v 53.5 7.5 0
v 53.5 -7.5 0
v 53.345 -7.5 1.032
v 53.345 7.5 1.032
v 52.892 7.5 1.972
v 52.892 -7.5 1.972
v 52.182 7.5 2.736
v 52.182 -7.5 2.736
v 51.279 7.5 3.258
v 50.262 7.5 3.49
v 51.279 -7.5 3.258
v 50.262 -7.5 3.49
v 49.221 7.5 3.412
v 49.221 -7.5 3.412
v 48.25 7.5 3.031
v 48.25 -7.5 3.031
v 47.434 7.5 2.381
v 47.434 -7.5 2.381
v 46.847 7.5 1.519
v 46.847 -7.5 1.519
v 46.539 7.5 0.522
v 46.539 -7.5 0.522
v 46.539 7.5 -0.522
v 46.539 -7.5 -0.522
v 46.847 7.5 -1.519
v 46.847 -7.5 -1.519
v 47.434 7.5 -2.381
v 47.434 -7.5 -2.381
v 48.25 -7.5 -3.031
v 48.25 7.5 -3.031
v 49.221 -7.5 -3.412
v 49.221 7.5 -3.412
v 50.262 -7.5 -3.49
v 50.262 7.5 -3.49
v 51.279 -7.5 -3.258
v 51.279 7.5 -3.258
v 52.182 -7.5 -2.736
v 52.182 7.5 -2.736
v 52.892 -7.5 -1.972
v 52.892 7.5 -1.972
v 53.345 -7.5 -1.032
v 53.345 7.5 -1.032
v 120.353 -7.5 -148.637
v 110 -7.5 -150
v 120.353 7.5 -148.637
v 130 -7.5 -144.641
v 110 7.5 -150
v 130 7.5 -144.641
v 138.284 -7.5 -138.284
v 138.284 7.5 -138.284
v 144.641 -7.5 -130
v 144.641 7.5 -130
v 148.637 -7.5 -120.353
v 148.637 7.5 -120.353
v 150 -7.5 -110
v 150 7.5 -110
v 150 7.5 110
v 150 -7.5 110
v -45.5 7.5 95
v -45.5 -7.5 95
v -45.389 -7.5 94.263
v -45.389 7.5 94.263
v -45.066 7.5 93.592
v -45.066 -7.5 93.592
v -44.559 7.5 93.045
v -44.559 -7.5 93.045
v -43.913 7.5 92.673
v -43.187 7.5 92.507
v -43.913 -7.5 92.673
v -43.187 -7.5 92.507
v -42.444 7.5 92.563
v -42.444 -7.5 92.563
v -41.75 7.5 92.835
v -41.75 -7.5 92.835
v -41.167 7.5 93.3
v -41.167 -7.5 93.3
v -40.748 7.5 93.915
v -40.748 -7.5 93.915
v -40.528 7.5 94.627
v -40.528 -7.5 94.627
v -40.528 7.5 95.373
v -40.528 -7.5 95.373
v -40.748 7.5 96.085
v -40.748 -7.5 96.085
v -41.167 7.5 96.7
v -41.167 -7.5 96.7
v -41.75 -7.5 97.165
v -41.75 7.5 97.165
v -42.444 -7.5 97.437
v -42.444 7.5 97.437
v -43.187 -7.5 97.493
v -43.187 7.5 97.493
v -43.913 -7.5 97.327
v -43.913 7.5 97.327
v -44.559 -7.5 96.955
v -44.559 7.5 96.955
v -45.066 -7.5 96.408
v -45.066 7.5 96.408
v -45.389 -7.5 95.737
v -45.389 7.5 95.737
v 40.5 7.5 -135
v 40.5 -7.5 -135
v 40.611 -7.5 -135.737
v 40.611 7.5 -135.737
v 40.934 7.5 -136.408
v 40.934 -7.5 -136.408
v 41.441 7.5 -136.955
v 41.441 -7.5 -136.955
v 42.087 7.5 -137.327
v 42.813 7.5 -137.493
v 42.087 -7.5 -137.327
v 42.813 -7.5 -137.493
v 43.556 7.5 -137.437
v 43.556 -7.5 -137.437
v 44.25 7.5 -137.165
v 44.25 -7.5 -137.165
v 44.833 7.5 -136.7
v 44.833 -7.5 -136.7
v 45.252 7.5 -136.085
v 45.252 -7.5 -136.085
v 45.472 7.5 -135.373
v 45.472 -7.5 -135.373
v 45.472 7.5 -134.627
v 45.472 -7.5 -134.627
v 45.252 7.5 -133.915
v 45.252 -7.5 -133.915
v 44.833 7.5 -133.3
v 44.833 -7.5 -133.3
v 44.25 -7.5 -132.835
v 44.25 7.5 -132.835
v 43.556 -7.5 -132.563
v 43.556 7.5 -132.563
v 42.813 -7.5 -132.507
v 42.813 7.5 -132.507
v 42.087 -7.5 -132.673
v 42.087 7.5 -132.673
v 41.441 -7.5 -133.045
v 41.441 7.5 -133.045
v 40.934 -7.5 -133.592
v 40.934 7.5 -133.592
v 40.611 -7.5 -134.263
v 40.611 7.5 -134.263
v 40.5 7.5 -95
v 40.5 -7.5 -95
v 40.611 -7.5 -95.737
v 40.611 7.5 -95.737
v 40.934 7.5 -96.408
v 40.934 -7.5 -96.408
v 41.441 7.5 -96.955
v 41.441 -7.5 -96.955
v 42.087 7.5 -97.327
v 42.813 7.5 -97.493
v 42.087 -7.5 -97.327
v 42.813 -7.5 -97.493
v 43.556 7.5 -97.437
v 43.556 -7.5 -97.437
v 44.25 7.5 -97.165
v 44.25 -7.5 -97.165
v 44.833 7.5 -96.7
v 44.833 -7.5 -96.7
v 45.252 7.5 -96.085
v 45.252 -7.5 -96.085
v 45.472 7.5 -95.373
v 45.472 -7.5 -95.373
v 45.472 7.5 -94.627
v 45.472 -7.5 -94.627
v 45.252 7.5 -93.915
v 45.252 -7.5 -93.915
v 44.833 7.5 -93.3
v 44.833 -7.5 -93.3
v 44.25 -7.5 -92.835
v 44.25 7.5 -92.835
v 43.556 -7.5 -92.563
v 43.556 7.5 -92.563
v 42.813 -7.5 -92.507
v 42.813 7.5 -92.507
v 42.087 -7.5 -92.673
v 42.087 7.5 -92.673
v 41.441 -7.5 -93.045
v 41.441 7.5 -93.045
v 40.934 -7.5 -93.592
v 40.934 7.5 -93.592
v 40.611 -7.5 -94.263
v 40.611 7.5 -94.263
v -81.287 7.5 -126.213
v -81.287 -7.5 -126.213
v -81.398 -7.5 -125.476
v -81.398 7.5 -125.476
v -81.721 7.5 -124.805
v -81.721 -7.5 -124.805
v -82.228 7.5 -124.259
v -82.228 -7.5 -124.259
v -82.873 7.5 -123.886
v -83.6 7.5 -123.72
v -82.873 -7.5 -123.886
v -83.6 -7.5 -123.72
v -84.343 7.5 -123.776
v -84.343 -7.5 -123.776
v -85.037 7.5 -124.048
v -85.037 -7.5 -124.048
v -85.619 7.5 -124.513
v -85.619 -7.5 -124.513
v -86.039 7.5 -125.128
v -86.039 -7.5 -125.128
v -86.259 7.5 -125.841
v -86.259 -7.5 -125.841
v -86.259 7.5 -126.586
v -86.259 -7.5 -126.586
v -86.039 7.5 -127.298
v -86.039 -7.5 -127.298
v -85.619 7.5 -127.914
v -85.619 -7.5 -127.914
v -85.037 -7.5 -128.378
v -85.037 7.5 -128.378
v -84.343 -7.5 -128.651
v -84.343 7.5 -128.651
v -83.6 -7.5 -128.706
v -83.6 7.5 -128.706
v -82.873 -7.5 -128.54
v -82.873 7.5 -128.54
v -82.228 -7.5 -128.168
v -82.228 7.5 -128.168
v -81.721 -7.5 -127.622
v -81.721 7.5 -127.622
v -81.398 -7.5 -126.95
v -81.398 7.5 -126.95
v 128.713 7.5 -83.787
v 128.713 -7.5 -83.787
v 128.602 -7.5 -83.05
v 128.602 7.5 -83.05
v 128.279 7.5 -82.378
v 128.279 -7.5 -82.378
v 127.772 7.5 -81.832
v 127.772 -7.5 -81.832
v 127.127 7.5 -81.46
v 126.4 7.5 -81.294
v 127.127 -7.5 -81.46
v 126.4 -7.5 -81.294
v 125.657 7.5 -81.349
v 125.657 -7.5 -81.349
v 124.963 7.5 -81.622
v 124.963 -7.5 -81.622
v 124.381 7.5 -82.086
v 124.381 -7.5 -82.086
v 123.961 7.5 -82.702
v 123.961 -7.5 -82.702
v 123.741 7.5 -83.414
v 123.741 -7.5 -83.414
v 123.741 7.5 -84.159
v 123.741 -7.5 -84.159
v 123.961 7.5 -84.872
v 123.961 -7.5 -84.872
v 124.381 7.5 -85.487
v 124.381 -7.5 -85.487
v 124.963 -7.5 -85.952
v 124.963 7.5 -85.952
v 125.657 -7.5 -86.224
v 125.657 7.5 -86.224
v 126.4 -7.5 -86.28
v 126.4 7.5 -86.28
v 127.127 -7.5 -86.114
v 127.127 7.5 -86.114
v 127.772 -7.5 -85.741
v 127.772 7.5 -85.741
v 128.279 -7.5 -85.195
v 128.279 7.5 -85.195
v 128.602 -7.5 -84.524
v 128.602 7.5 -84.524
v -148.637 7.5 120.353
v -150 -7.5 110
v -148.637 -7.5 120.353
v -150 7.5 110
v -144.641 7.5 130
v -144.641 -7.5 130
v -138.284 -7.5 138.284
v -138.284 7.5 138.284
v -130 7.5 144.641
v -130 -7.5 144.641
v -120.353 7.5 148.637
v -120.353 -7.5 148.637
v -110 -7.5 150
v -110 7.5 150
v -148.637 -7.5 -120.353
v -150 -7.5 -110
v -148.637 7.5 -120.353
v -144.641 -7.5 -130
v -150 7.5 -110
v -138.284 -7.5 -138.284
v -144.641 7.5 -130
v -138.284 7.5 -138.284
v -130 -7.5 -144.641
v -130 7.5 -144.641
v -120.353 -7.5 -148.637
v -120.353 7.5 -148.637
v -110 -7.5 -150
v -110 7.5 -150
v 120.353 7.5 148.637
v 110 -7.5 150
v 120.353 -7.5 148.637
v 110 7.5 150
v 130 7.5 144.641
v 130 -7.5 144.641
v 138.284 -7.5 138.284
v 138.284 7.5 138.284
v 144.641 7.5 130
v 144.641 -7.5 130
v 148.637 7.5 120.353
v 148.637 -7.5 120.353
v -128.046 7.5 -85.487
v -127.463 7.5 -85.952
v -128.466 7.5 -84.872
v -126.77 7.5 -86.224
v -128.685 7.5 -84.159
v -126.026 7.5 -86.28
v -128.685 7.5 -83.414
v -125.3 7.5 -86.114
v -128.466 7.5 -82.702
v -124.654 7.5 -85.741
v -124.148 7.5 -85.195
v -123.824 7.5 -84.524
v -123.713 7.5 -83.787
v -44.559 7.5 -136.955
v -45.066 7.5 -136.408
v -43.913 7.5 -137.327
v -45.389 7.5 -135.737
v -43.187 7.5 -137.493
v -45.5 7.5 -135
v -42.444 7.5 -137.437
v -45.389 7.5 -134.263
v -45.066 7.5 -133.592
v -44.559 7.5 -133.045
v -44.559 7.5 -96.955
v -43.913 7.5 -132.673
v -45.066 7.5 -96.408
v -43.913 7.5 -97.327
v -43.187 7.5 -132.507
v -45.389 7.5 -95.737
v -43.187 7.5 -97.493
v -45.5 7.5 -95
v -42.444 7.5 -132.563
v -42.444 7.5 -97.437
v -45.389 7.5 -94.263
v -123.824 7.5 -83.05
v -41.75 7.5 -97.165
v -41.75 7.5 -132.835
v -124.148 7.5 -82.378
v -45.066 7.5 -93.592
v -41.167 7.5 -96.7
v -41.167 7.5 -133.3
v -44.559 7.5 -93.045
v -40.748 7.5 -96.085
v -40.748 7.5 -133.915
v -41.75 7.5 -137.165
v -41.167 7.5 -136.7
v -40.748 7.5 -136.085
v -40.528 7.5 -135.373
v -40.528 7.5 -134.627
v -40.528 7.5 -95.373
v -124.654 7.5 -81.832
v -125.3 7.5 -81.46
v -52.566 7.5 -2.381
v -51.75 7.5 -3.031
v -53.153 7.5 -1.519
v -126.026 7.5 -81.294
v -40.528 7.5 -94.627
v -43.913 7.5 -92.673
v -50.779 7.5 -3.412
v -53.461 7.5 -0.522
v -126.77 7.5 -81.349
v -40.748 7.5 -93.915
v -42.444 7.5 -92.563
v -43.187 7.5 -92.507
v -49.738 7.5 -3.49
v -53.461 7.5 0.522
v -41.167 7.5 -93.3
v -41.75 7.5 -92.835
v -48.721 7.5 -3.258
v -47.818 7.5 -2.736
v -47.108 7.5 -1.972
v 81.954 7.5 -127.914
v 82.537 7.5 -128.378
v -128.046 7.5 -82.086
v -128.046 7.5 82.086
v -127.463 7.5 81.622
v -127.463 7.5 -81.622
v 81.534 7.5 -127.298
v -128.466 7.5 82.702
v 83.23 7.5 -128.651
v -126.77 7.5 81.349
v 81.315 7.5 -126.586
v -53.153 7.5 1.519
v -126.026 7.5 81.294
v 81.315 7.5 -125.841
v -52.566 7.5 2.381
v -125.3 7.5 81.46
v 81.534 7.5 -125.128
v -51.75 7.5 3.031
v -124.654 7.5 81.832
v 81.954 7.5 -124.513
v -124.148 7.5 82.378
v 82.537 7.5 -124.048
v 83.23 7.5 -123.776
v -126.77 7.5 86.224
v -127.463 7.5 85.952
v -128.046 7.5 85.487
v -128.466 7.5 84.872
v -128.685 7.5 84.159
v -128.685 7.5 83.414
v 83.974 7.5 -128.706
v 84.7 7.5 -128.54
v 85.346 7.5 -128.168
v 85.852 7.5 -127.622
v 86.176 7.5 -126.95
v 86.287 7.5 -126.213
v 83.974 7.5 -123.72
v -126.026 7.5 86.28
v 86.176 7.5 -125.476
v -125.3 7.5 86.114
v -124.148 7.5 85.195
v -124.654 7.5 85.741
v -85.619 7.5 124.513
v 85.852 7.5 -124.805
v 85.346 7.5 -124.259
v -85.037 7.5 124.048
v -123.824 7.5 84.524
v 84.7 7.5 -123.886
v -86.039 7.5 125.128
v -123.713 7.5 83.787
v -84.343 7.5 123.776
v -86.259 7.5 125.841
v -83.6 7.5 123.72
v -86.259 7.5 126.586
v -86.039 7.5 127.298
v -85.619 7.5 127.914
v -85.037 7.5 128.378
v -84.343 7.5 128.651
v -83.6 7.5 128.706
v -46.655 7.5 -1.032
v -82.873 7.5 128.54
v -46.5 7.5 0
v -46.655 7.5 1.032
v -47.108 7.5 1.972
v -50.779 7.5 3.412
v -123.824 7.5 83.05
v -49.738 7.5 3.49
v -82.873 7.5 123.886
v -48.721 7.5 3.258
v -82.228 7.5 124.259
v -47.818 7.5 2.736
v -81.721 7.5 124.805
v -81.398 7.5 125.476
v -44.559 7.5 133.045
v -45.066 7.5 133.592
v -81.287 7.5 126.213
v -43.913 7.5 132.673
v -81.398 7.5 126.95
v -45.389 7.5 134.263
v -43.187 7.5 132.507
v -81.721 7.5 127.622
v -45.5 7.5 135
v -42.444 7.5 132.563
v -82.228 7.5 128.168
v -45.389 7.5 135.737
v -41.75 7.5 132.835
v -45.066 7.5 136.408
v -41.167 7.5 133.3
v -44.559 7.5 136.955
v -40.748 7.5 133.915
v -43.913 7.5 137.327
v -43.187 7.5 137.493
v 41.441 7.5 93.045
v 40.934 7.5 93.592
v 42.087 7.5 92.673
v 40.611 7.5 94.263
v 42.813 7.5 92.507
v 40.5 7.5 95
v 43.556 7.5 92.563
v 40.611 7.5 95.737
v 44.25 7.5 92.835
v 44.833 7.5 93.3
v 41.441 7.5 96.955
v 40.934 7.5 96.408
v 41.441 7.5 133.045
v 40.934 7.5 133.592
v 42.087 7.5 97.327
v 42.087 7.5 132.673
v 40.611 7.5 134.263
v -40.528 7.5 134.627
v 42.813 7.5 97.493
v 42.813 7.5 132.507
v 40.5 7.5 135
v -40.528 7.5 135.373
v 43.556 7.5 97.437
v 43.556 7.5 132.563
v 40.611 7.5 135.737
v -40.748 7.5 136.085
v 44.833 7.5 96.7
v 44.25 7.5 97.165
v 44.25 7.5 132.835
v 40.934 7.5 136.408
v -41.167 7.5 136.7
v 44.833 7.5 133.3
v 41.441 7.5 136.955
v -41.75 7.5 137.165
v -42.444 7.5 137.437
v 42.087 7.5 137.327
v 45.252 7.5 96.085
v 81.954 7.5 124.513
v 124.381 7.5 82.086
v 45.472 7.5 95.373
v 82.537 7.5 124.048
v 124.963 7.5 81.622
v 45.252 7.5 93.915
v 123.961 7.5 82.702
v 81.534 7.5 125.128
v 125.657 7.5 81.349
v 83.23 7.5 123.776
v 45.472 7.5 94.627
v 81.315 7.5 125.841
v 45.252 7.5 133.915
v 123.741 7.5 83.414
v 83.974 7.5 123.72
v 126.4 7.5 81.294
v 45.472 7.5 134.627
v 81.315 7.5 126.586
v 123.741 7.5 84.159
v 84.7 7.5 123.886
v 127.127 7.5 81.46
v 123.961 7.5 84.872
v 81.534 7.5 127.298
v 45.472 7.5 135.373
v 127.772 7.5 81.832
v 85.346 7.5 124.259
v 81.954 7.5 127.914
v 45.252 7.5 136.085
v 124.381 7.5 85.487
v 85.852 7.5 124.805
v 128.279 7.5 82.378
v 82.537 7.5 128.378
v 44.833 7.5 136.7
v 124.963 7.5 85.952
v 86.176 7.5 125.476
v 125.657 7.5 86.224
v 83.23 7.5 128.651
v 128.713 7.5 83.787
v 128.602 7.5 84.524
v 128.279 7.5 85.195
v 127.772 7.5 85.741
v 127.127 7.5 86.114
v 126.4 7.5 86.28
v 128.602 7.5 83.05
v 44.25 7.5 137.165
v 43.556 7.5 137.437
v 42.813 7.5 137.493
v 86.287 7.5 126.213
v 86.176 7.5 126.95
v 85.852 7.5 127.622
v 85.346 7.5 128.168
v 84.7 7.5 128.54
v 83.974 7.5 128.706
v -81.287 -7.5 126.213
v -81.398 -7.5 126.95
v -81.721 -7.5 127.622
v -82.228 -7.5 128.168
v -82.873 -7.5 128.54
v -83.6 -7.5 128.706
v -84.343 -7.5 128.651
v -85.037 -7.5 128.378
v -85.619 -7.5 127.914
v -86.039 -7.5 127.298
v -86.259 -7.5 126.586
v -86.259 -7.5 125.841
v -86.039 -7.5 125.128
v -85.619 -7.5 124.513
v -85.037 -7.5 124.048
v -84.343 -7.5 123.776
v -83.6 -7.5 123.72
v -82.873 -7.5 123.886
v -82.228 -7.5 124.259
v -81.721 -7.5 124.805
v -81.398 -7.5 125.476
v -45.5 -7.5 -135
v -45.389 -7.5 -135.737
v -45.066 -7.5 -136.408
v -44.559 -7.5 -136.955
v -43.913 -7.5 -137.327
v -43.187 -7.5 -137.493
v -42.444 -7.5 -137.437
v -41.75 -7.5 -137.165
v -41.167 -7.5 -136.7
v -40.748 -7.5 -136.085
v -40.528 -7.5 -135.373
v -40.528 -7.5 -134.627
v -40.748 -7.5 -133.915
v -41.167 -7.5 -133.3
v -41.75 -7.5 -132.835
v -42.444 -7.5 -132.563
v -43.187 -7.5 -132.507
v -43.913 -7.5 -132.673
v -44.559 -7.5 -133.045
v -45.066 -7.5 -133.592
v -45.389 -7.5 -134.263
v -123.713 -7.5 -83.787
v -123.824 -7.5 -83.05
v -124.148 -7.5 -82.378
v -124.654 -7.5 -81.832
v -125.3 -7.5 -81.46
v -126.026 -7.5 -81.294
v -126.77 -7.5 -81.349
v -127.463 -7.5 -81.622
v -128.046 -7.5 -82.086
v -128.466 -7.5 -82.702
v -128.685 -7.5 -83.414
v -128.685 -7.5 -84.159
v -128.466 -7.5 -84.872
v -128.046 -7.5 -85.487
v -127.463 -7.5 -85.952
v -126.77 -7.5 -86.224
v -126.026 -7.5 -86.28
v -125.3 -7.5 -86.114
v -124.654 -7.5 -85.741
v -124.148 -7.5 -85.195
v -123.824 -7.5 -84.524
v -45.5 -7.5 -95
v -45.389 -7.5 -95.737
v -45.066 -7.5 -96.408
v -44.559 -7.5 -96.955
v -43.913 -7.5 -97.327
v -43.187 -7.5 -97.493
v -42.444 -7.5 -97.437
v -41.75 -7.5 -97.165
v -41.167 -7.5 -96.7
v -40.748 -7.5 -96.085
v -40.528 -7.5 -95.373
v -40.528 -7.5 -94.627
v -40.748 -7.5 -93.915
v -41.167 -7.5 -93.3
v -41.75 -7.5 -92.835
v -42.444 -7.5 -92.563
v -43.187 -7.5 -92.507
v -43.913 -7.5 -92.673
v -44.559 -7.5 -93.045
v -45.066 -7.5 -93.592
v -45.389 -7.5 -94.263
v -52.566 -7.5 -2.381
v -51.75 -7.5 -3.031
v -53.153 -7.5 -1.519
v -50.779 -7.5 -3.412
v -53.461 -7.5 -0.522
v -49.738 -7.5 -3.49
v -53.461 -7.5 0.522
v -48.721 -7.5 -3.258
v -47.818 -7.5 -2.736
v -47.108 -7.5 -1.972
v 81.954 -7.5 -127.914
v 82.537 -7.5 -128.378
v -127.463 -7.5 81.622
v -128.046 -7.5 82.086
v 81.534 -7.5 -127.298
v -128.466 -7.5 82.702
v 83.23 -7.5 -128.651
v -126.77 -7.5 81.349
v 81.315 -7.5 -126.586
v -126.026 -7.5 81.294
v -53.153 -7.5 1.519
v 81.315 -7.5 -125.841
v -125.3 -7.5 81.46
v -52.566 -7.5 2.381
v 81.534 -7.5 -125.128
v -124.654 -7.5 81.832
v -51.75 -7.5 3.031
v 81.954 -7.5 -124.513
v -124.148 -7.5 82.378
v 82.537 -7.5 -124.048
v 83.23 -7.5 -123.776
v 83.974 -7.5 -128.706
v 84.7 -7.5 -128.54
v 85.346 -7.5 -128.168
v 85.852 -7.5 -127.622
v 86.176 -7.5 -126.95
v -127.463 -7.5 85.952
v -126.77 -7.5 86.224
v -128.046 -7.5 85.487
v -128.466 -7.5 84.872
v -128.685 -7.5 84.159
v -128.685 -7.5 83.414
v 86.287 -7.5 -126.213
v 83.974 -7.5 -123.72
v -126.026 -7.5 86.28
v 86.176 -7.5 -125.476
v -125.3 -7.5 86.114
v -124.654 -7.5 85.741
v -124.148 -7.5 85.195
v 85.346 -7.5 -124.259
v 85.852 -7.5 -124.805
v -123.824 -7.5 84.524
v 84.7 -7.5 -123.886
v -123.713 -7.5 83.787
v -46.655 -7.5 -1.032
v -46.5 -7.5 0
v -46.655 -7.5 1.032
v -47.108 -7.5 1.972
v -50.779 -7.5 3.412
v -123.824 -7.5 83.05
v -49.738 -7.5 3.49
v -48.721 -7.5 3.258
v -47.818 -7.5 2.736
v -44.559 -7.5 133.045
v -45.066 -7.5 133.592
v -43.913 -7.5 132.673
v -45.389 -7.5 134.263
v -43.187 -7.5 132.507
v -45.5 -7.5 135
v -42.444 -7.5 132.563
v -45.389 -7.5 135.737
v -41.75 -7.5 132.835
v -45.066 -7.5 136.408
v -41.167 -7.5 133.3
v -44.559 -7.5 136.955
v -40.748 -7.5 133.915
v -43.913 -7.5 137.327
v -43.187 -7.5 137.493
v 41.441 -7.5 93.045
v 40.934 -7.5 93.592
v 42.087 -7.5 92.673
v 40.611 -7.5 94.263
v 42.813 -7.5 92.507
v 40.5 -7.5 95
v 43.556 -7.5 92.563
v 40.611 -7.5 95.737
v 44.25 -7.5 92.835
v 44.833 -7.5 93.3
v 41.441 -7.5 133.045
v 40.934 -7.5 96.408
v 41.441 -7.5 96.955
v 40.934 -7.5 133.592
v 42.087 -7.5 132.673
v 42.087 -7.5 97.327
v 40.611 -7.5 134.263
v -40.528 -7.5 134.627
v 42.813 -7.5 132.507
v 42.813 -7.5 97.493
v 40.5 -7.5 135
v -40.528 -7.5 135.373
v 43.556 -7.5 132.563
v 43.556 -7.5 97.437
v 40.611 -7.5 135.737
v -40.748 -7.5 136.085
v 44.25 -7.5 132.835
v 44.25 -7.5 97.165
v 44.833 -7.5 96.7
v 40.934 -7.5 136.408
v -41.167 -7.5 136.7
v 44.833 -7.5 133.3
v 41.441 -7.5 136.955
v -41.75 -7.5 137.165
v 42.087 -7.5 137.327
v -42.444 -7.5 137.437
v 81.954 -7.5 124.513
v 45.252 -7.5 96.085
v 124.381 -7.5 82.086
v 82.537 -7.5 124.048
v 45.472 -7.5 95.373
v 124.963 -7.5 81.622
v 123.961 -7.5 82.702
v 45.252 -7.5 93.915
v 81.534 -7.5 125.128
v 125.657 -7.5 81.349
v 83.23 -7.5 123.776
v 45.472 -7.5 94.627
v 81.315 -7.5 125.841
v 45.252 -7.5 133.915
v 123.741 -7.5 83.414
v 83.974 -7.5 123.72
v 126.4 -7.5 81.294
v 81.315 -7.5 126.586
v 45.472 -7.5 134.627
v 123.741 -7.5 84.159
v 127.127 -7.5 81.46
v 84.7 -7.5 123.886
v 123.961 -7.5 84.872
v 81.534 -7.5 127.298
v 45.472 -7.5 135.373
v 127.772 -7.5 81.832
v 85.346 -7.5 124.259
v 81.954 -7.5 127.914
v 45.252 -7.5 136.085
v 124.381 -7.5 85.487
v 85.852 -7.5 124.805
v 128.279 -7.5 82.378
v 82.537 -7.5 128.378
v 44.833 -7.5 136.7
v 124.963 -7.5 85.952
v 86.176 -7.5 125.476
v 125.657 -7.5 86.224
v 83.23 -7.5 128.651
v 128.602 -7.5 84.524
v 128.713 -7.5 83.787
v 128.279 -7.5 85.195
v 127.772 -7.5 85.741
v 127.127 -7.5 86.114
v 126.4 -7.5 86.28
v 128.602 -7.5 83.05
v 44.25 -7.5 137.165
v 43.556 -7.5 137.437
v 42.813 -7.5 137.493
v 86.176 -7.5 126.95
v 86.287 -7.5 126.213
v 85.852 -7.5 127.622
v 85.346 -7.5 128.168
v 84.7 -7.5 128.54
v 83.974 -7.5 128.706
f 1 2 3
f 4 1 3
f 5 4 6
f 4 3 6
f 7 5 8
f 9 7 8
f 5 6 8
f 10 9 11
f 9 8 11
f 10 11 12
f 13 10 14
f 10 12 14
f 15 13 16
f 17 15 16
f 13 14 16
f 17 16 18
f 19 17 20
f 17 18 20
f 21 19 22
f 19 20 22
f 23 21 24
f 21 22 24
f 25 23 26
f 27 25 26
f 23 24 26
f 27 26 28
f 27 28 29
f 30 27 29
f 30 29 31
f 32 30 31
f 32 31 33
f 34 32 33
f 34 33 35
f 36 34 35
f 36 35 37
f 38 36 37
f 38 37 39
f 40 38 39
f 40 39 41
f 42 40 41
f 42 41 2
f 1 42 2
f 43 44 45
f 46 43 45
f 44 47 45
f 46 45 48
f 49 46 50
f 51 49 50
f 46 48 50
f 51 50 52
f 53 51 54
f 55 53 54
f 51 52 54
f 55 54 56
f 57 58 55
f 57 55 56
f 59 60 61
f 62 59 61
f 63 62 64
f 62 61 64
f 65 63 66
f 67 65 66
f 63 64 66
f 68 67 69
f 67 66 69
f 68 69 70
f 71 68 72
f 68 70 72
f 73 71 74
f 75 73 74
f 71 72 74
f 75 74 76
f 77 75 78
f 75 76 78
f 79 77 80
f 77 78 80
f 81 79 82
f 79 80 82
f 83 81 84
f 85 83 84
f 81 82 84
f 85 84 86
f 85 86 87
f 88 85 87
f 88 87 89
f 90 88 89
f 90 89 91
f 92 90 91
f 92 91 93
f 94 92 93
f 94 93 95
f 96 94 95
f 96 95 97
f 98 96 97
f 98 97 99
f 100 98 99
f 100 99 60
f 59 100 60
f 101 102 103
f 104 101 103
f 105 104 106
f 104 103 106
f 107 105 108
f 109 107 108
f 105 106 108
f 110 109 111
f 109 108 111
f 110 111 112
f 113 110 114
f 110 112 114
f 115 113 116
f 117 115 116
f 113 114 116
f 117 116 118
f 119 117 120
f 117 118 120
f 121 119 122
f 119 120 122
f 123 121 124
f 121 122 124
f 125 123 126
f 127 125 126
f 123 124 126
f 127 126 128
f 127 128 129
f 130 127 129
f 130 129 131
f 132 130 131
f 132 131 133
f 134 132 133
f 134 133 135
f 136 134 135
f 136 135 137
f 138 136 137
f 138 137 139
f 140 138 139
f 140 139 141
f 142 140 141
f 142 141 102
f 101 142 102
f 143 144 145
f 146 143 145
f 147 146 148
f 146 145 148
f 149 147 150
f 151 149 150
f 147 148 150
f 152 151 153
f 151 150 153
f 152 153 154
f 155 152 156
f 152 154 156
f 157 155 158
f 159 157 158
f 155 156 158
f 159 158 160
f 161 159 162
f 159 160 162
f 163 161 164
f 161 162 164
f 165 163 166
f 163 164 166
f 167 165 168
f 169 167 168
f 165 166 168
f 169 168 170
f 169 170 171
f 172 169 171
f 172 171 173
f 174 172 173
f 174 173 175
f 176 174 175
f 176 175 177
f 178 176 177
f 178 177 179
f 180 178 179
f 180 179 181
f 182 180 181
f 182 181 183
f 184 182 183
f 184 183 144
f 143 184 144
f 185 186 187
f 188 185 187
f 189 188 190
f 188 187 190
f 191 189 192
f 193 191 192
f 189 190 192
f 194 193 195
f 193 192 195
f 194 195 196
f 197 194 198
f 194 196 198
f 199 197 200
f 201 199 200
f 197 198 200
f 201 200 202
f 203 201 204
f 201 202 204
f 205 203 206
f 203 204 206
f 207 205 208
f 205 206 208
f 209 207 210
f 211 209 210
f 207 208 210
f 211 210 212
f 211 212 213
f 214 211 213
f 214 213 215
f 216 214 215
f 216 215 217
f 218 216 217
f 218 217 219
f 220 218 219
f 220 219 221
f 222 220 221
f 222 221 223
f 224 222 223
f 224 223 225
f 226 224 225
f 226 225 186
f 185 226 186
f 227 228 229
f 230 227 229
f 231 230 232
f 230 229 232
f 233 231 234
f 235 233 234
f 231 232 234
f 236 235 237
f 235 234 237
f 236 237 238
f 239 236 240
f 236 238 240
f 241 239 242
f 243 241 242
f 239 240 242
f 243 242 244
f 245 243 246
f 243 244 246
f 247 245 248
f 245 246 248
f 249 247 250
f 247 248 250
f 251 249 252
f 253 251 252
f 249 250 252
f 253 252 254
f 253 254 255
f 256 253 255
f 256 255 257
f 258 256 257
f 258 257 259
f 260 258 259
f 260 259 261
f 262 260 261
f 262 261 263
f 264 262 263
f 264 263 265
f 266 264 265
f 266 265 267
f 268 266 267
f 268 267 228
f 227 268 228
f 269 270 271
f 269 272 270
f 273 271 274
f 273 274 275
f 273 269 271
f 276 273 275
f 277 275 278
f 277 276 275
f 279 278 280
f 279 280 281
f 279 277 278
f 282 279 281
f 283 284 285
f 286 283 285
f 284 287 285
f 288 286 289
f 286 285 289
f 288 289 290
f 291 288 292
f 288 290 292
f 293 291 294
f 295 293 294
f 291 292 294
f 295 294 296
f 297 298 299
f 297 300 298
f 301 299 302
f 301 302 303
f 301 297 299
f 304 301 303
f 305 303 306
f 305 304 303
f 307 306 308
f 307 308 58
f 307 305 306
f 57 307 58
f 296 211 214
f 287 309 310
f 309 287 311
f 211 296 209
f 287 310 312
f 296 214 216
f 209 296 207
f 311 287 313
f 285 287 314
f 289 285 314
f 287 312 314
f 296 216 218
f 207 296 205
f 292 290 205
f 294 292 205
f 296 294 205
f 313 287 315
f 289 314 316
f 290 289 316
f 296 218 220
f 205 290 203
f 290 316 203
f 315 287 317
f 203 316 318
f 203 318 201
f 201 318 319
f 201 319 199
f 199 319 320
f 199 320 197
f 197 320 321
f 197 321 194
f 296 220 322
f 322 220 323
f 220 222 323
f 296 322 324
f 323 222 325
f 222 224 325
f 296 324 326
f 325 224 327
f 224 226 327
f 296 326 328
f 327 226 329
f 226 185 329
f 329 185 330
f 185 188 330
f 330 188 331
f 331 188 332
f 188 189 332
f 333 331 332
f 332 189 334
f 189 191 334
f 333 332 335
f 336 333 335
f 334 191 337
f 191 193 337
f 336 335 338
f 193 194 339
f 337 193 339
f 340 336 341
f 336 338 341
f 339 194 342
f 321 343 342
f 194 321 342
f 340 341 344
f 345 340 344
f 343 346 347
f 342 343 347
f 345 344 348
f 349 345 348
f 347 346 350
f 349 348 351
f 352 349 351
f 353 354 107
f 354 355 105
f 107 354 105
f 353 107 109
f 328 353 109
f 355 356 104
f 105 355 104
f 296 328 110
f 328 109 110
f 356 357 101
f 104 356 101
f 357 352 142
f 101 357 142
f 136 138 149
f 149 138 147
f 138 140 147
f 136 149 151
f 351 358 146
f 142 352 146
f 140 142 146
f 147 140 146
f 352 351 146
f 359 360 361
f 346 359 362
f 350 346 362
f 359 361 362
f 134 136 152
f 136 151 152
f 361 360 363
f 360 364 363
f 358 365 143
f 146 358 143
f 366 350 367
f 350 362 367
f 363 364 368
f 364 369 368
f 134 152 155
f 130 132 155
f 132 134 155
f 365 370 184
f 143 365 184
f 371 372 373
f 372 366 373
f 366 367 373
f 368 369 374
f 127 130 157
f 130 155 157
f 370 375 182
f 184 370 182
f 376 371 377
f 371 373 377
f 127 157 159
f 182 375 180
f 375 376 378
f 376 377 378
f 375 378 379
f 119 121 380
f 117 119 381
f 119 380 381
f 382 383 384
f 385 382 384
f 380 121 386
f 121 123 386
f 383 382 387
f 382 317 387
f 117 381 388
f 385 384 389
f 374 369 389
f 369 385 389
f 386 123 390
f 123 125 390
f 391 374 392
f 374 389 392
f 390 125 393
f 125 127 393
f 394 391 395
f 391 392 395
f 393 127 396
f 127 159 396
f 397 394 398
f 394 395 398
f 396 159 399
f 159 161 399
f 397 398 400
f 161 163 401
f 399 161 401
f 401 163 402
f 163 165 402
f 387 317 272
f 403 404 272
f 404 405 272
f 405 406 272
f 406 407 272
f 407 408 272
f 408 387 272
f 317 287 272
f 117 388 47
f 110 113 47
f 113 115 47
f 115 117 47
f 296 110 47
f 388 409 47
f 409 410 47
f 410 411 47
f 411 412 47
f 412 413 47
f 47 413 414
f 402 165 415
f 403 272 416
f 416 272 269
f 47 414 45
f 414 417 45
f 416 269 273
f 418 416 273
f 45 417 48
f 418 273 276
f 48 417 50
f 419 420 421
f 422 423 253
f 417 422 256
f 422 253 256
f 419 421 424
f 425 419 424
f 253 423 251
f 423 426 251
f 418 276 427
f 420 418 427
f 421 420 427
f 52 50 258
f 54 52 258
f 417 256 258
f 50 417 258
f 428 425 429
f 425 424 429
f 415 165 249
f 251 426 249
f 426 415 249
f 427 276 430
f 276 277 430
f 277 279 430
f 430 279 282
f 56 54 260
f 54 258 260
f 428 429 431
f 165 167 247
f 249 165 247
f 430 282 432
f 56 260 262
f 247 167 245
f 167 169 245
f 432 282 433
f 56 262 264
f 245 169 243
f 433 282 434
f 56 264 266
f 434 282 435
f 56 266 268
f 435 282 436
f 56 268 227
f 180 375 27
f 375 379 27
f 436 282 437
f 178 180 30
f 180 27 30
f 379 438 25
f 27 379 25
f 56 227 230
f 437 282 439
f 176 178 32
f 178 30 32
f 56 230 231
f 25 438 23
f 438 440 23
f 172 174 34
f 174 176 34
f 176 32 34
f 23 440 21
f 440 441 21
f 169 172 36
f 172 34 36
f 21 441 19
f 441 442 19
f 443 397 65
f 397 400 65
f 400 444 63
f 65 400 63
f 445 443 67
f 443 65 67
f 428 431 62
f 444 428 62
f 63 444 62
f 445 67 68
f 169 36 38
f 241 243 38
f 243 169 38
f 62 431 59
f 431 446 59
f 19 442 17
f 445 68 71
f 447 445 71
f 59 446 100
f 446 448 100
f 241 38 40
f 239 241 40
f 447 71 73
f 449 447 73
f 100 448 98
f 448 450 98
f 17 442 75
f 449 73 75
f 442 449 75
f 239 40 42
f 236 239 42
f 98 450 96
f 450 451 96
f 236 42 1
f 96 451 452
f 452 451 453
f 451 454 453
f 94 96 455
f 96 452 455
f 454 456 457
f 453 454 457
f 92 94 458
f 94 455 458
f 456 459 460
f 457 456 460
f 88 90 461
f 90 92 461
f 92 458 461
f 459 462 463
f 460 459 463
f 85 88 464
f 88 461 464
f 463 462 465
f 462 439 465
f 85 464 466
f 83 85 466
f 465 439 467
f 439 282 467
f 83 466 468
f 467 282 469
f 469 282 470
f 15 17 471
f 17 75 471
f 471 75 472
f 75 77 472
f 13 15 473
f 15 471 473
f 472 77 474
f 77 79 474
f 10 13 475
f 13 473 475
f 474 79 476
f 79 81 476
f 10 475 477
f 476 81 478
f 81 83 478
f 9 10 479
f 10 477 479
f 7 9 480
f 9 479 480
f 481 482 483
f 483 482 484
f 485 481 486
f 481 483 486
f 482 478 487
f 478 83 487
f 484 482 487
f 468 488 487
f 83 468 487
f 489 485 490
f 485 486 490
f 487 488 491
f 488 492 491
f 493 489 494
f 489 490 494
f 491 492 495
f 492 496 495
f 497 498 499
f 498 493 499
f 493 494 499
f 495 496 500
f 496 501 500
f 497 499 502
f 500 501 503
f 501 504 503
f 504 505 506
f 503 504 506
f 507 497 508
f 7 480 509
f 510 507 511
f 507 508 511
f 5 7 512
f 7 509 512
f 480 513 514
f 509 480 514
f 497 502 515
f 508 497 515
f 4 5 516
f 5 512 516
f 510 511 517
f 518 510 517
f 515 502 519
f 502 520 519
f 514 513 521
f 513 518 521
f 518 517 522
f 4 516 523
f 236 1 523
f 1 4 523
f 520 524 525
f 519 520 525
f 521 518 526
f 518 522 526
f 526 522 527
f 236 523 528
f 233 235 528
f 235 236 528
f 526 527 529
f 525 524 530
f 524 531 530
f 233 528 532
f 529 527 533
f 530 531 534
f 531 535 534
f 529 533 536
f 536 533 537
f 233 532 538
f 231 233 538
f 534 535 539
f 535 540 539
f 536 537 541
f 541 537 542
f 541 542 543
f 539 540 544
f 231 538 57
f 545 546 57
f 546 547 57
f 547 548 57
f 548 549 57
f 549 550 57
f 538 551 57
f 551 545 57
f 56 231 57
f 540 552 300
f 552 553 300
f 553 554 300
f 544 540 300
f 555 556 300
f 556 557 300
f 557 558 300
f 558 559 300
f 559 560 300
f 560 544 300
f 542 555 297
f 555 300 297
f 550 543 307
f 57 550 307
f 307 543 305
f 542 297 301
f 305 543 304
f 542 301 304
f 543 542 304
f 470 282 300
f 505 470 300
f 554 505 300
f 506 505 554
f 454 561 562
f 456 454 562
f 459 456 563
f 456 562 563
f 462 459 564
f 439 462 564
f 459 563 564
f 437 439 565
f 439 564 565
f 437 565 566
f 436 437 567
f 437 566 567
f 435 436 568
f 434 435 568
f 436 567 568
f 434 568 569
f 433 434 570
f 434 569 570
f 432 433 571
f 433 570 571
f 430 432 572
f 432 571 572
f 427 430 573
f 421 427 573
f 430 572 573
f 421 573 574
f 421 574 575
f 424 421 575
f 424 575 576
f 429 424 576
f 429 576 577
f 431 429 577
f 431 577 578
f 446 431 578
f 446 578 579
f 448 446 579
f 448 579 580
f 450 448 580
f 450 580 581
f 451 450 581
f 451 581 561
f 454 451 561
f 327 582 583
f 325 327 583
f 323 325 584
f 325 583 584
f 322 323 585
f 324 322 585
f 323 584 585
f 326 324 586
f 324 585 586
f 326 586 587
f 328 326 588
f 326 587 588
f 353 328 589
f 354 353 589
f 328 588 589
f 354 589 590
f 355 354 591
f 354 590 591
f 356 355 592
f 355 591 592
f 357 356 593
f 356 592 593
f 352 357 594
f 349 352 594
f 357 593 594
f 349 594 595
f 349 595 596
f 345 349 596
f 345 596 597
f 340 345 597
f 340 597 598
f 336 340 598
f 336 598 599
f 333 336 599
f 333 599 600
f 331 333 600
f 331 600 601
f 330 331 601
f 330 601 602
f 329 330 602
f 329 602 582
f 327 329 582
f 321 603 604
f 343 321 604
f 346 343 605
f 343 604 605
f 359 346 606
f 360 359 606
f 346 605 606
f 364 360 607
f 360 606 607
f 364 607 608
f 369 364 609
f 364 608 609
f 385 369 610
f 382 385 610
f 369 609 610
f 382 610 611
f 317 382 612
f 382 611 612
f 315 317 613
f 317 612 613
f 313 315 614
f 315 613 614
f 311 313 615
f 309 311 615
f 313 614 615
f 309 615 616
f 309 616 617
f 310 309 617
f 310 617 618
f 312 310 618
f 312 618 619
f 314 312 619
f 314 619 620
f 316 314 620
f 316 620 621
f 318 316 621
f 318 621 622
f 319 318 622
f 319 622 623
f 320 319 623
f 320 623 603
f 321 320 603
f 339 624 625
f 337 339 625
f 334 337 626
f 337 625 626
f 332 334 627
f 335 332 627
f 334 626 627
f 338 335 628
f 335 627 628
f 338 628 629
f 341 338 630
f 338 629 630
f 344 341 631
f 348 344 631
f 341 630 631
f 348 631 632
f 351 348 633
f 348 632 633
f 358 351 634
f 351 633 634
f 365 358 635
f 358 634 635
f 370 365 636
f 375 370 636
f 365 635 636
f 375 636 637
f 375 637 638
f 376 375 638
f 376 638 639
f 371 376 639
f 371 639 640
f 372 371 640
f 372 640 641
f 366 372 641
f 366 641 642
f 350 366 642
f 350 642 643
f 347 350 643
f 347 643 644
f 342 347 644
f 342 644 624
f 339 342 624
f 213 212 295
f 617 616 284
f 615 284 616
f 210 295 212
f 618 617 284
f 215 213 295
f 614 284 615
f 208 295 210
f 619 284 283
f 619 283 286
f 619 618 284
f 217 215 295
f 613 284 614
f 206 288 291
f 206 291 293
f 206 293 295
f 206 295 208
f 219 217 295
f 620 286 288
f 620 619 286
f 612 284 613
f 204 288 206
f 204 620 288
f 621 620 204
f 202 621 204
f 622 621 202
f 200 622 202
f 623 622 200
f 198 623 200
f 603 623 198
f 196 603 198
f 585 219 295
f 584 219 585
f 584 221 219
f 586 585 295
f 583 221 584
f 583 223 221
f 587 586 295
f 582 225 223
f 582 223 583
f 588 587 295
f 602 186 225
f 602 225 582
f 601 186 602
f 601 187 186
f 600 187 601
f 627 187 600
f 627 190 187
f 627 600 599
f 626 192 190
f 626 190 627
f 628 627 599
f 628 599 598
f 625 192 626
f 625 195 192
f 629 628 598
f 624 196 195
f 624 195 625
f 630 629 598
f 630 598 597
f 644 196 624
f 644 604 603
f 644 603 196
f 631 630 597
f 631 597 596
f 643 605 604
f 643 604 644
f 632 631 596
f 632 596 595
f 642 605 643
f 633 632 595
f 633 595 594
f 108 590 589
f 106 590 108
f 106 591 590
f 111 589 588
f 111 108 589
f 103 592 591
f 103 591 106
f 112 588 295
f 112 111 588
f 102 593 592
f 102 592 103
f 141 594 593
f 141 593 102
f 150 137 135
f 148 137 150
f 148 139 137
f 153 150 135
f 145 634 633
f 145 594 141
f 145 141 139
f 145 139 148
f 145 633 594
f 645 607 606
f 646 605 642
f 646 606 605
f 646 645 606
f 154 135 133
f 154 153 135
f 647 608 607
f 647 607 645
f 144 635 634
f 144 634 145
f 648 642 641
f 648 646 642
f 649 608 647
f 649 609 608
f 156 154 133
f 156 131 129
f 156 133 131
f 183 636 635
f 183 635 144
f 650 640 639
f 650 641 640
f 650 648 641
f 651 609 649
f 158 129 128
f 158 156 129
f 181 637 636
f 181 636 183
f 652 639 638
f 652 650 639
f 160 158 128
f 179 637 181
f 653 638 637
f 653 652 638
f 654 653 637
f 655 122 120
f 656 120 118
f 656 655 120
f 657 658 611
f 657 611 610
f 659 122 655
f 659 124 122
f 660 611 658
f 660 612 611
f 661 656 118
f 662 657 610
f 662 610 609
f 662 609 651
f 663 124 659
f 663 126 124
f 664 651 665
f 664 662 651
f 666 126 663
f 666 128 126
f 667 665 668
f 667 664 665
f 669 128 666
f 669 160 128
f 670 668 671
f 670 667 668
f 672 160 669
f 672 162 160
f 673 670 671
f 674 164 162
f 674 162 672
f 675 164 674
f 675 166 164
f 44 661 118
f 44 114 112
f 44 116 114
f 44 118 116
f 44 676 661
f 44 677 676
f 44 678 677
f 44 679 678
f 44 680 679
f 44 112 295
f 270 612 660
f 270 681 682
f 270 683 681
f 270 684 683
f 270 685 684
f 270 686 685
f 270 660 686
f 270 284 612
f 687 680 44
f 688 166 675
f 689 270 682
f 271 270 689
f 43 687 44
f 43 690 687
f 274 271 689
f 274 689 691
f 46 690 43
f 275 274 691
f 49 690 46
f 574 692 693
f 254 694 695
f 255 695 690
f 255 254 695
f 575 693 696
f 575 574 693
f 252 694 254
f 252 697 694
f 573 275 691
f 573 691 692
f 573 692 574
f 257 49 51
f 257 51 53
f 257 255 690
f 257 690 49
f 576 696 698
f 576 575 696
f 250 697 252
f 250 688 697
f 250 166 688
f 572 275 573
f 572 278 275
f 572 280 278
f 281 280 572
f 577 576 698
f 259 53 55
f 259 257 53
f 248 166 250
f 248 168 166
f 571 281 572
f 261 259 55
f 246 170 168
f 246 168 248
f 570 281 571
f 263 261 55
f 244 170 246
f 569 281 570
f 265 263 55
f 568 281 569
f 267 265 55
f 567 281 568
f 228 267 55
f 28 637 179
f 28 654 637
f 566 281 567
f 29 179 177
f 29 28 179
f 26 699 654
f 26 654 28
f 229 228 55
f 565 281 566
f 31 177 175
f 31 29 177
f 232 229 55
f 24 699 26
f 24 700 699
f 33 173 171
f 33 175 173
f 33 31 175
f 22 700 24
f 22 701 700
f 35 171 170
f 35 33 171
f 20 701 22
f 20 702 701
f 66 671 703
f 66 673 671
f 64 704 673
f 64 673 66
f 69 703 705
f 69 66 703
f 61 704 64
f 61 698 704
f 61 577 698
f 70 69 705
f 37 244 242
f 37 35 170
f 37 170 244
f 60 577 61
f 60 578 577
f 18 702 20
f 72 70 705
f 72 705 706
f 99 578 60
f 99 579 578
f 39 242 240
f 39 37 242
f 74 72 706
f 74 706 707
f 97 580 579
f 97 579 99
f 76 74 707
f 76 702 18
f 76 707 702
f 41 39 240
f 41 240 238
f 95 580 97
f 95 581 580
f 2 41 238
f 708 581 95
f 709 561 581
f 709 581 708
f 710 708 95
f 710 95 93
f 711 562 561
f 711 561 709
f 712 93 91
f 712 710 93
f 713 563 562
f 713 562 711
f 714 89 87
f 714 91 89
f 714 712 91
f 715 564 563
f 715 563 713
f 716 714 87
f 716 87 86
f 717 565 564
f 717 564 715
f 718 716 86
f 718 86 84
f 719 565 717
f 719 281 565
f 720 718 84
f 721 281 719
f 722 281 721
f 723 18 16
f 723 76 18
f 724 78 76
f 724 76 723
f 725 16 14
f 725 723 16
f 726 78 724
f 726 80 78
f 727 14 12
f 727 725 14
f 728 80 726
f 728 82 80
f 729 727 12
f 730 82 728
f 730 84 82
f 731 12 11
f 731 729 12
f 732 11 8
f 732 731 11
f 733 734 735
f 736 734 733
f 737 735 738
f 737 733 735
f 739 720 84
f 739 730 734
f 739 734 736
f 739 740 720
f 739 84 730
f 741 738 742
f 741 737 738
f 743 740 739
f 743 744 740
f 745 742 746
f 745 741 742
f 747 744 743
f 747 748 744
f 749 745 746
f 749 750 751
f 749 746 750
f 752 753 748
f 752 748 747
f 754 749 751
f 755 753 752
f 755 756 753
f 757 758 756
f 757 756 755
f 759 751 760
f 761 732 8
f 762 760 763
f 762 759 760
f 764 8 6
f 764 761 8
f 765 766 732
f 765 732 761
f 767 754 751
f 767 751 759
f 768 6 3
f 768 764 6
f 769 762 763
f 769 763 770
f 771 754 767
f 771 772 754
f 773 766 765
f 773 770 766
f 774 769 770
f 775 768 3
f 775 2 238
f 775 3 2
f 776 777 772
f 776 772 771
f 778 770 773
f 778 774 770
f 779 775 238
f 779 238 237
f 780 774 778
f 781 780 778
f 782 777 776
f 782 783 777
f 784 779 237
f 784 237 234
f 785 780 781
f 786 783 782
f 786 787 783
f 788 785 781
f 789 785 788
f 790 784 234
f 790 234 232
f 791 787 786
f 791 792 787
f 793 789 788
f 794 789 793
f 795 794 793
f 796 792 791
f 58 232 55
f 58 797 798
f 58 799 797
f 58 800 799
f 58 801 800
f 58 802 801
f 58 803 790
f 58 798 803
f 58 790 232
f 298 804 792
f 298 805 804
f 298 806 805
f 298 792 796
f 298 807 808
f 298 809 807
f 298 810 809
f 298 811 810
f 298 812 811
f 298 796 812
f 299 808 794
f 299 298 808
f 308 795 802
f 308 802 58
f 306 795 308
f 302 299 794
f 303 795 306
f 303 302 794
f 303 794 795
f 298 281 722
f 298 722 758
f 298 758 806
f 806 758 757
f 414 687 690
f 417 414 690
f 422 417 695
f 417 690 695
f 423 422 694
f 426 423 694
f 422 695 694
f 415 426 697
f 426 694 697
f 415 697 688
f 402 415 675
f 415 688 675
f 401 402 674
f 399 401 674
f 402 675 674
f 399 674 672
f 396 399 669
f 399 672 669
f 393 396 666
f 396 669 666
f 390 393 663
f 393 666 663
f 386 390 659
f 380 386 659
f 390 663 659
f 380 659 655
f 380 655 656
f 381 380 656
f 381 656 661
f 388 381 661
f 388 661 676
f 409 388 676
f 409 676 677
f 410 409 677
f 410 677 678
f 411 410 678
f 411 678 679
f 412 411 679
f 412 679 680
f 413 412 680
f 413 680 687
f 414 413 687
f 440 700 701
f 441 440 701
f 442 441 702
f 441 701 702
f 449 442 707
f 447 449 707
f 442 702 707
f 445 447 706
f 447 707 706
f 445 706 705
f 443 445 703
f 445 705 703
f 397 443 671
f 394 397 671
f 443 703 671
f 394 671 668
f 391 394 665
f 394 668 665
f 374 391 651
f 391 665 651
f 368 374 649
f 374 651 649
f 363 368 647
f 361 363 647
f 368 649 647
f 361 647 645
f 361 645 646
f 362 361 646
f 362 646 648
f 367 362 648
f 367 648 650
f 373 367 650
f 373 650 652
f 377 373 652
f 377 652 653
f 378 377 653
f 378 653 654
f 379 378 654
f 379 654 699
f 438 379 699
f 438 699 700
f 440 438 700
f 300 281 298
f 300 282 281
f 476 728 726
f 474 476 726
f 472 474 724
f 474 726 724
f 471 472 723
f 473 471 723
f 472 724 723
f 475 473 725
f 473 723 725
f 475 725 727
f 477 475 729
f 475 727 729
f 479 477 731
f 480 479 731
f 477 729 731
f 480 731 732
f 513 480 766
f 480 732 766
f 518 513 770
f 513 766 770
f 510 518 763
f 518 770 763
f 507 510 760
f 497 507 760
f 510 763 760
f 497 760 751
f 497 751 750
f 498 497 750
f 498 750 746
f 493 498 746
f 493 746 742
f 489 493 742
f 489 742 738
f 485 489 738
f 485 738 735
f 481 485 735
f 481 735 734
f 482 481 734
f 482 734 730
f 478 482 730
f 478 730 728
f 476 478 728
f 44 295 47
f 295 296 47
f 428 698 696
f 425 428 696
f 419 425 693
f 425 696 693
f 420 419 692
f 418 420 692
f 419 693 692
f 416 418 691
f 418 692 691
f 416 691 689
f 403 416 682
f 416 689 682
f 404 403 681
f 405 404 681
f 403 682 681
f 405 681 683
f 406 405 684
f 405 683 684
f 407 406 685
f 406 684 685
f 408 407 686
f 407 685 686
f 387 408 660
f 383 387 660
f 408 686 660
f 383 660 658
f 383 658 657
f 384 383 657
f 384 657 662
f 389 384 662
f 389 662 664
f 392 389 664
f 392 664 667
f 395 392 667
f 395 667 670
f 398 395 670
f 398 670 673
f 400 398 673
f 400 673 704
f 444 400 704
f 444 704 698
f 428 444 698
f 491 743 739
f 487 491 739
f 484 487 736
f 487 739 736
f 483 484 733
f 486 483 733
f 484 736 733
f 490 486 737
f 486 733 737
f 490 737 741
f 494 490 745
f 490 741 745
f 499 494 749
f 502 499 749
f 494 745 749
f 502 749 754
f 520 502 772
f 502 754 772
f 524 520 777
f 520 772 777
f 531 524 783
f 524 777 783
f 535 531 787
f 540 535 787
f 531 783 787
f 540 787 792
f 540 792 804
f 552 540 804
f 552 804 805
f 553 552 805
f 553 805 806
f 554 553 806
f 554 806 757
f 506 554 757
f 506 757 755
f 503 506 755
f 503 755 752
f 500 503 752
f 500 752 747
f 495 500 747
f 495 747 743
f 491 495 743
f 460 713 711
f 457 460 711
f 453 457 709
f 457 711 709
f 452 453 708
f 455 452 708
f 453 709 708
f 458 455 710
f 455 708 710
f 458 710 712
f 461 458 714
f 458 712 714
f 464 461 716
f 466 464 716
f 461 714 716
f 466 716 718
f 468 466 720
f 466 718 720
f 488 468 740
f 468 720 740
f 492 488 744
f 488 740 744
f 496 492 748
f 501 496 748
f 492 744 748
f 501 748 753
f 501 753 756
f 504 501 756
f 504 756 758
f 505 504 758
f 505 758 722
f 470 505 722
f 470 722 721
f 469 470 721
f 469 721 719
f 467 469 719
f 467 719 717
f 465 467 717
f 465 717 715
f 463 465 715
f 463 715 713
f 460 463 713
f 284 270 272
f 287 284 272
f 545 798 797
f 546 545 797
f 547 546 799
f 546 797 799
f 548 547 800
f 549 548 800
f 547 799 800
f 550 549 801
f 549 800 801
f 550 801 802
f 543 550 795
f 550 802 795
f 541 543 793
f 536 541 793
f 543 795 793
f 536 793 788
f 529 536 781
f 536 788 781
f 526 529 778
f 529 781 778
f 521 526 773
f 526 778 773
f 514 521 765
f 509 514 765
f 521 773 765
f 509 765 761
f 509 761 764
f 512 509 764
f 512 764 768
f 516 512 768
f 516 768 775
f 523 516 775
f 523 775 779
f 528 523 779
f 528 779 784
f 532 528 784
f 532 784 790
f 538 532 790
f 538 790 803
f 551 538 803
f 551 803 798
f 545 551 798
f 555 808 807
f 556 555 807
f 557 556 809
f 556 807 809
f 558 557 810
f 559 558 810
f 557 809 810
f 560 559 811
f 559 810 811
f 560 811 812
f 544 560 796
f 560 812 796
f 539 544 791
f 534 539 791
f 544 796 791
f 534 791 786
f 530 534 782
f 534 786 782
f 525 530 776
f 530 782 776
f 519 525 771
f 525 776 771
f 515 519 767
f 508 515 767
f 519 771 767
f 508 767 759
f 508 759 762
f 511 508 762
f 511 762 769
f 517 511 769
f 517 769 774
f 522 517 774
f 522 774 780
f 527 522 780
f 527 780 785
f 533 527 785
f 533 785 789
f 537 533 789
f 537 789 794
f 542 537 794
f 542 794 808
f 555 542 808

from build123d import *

# Parameters (mm, degrees)
SKETCH1_W               = 300
SKETCH1_H               = 15
BOSS_EXTRUDE1_DEPTH     = 150
SKETCH5_R               = 3.5
CUT_EXTRUDE3_DEPTH      = 1
CUT_EXTRUDE3_DEPTH_BACK = 16
SKETCH8_R               = 2.5
CUT_EXTRUDE5_DEPTH      = 16
FILLET4_R               = 40
SKETCH9_R               = 2.5
CUT_EXTRUDE6_DEPTH      = 16


with BuildPart() as part:
    # Sketch1 → Boss-Extrude1 (new body, symmetric)
    with BuildSketch(Plane.XY):
        Rectangle(SKETCH1_W, SKETCH1_H)
    extrude(amount=BOSS_EXTRUDE1_DEPTH, both=True)

    # Sketch5 → Cut-Extrude3 (cut, two sides)
    with BuildSketch(Plane.XZ.offset(7.5)) as cut_extrude3_sk:
        with Locations((50, 0)):
            Circle(SKETCH5_R)
        with Locations((-50, 0)):
            Circle(SKETCH5_R)
    extrude(amount=CUT_EXTRUDE3_DEPTH, mode=Mode.SUBTRACT)
    extrude(cut_extrude3_sk.sketch, amount=-CUT_EXTRUDE3_DEPTH_BACK, mode=Mode.SUBTRACT)

    # Sketch8 → Cut-Extrude5 (cut, through all)
    with BuildSketch(Plane.XZ.offset(7.5)):
        with Locations((-126.213203436, 83.786796564)):
            Circle(SKETCH8_R)
        with Locations((-83.786796564, 126.213203436)):
            Circle(SKETCH8_R)
        with Locations((126.213203436, 83.786796564)):
            Circle(SKETCH8_R)
        with Locations((83.786796564, 126.213203436)):
            Circle(SKETCH8_R)
        with Locations((83.786796564, -126.213203436)):
            Circle(SKETCH8_R)
        with Locations((126.213203436, -83.786796564)):
            Circle(SKETCH8_R)
        with Locations((-126.213203436, -83.786796564)):
            Circle(SKETCH8_R)
        with Locations((-83.786796564, -126.213203436)):
            Circle(SKETCH8_R)
    extrude(amount=-CUT_EXTRUDE5_DEPTH, mode=Mode.SUBTRACT)

    # Fillet4
    fillet4_edges = [part.edges().sort_by_distance(p)[0] for p in [
        (-150, 0, 150),
        (150, 0, 150),
        (-150, 0, -150),
        (150, 0, -150),
    ]]
    fillet(fillet4_edges, radius=FILLET4_R)

    # Sketch9 → Cut-Extrude6 (cut, through all)
    with BuildSketch(Plane(origin=(0, -7.5, 0), x_dir=(-1, 0, 0), z_dir=(0, -1, 0))):
        with Locations((43, -135)):
            Circle(SKETCH9_R)
        with Locations((-43, -135)):
            Circle(SKETCH9_R)
        with Locations((-43, -95)):
            Circle(SKETCH9_R)
        with Locations((43, -95)):
            Circle(SKETCH9_R)
        with Locations((-43, 95)):
            Circle(SKETCH9_R)
        with Locations((-43, 135)):
            Circle(SKETCH9_R)
        with Locations((43, 135)):
            Circle(SKETCH9_R)
        with Locations((43, 95)):
            Circle(SKETCH9_R)
    extrude(amount=-CUT_EXTRUDE6_DEPTH, mode=Mode.SUBTRACT)


solid = part.part
